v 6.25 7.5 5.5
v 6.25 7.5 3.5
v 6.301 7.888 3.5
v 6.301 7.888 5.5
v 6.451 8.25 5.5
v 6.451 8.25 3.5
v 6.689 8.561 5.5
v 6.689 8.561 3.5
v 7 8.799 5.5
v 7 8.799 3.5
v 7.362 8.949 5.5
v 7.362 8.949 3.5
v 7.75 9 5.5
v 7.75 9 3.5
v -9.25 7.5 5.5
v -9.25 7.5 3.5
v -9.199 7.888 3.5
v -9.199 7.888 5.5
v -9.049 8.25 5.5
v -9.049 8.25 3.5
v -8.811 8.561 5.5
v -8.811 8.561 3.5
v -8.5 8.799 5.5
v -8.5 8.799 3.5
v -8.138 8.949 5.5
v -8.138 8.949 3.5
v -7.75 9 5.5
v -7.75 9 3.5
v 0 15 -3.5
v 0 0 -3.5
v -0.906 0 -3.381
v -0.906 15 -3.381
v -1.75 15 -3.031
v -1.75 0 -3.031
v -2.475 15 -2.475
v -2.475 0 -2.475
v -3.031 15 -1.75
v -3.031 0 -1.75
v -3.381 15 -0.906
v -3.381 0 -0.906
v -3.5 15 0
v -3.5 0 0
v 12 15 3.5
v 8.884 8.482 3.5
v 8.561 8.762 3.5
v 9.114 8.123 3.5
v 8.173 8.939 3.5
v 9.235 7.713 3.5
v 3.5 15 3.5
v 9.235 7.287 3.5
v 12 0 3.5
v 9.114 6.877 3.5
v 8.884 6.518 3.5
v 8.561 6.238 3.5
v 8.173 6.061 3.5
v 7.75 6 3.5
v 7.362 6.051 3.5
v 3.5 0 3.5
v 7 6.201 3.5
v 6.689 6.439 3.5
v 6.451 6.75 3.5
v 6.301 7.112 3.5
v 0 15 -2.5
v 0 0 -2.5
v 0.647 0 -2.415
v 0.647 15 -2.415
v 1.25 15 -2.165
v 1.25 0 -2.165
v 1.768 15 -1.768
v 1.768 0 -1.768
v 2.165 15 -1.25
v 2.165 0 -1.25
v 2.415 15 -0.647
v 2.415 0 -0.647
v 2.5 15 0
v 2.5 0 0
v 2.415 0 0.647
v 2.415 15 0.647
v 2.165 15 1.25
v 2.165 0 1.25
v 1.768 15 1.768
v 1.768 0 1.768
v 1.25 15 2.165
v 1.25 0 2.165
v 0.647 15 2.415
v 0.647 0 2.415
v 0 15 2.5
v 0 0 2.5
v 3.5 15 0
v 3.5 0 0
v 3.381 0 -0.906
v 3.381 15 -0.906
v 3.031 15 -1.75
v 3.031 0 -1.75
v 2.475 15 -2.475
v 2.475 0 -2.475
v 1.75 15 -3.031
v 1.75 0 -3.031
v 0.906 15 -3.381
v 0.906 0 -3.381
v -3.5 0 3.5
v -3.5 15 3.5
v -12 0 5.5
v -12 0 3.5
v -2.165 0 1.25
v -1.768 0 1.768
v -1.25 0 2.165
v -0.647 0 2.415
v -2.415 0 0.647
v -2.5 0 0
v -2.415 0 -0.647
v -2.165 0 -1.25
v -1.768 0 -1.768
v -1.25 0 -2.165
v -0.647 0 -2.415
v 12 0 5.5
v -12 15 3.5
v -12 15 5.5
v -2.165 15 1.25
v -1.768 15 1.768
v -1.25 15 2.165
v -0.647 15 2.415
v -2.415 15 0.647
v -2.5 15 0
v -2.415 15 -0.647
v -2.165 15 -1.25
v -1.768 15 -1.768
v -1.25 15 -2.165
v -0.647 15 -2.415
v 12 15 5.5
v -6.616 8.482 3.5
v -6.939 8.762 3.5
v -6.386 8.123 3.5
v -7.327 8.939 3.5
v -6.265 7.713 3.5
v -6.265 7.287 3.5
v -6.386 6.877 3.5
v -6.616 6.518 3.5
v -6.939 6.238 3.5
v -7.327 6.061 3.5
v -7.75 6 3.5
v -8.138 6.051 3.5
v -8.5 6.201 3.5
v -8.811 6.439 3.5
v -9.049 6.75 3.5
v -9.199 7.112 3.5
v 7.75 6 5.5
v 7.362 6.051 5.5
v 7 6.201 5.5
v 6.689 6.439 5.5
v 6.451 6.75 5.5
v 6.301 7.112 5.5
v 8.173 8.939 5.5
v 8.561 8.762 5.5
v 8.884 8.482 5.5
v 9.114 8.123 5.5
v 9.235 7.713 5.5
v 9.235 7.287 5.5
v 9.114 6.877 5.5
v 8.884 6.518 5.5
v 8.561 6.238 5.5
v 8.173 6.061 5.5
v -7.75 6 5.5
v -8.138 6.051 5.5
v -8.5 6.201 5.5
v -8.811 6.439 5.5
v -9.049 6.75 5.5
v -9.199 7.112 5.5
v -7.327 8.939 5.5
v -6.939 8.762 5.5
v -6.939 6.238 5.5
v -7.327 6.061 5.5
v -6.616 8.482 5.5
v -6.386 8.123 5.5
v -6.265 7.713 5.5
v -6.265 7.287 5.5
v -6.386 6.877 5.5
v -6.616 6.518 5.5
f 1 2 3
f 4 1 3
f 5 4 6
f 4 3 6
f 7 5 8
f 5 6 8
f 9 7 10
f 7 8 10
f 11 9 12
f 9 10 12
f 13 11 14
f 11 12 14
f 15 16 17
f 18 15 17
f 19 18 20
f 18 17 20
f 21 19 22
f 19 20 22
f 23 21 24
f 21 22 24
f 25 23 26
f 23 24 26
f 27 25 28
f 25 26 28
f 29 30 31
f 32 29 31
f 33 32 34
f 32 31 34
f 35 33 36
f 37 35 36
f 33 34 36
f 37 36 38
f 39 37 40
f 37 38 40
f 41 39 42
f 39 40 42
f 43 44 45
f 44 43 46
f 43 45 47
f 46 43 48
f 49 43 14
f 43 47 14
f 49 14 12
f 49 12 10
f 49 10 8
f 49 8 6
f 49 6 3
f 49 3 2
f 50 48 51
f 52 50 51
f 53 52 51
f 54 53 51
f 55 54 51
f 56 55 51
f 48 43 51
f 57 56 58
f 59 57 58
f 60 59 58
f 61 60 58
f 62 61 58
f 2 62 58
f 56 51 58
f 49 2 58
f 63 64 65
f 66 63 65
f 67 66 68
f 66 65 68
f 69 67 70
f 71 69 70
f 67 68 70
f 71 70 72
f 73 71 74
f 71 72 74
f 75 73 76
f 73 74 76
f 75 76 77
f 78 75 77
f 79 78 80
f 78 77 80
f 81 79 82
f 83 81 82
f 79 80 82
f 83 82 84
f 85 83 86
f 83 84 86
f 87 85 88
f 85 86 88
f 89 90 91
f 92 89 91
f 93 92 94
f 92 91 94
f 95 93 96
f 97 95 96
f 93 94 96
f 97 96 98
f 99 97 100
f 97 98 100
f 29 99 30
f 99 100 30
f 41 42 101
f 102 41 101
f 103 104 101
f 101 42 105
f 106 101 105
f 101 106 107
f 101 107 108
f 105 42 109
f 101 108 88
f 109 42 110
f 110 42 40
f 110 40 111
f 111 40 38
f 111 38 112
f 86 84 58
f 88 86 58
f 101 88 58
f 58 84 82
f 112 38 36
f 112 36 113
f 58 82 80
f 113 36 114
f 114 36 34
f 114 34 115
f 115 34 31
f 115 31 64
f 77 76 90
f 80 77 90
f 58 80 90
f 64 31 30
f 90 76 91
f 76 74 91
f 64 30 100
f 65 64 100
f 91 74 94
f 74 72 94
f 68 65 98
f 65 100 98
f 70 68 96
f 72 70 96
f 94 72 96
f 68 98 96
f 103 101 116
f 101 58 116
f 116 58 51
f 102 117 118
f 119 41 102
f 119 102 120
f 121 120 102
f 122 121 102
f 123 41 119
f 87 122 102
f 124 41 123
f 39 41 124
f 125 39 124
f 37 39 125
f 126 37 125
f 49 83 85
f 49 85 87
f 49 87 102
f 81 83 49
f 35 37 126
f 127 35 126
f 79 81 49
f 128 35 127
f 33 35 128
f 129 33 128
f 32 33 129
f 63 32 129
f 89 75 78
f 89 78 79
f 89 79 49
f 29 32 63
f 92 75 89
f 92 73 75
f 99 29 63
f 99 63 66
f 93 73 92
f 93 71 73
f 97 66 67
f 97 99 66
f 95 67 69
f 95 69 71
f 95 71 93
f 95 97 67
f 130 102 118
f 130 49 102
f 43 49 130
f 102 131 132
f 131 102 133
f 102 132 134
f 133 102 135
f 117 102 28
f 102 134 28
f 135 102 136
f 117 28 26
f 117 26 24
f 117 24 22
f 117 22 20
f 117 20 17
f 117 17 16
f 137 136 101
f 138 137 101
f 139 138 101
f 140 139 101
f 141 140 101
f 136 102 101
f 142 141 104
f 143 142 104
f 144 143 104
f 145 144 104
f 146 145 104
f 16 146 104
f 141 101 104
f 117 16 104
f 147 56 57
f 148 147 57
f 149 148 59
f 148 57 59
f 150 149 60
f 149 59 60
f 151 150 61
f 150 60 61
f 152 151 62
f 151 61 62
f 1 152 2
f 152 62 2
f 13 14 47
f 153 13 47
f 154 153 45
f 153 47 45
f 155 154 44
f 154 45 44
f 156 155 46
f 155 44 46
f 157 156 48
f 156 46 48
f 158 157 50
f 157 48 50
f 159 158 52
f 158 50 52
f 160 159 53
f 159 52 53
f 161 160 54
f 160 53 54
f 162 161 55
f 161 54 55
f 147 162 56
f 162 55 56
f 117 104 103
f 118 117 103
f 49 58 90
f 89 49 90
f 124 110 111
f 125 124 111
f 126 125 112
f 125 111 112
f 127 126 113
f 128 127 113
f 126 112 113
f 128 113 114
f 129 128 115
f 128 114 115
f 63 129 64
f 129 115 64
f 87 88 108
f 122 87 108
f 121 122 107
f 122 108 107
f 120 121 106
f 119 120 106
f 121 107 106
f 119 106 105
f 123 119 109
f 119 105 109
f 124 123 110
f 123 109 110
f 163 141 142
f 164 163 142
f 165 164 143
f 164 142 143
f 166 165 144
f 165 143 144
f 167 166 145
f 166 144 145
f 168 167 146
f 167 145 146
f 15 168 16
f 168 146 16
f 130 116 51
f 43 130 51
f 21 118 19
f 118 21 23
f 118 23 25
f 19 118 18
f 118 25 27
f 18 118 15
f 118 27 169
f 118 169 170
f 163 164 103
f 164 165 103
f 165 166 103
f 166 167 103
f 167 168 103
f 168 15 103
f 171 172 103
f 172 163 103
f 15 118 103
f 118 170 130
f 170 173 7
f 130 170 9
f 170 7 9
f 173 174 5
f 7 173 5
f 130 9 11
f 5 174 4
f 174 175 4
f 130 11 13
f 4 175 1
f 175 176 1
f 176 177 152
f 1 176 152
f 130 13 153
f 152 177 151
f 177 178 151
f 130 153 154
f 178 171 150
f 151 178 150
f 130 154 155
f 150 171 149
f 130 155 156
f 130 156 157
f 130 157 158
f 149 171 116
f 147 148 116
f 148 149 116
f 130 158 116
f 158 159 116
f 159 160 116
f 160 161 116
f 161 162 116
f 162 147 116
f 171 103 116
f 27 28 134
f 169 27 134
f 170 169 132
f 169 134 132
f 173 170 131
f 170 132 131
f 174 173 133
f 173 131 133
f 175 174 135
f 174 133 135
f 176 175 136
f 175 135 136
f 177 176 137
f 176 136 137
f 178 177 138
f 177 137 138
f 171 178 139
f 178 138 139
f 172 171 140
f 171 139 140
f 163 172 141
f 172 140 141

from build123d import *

# Parameters (mm, degrees)
BOSS_EXTRUDE1_DEPTH = 15
CUT_EXTRUDE1_DEPTH  = 21.4450483


with BuildPart() as part:
    # Sketch1 → Boss-Extrude1 (new body)
    with BuildSketch(Plane(origin=(0, 0, 0), x_dir=(1, 0, 0), z_dir=(0, 1, 0))):
        with BuildLine():
            ThreePointArc((0, 2.5), (1.767766953, 1.767766953), (2.5, 0))
            Line((2.5, 0), (3.5, 0))
            ThreePointArc((3.5, 0), (2.474873734, 2.474873734), (0, 3.5))
            Line((0, 3.5), (0, 2.5))
        make_face()
        with BuildLine():
            Line((-3.5, 0), (-2.5, 0))
            ThreePointArc((-2.5, 0), (-1.767766953, 1.767766953), (0, 2.5))
            Line((0, 2.5), (0, 3.5))
            ThreePointArc((0, 3.5), (-2.474873734, 2.474873734), (-3.5, 0))
        make_face()
        with BuildLine():
            Line((0, -5.5), (0, -2.5))
            ThreePointArc((0, -2.5), (-1.767766953, -1.767766953), (-2.5, 0))
            Line((-2.5, 0), (-3.5, 0))
            Line((-3.5, 0), (-3.5, -3.5))
            Line((-3.5, -3.5), (-12, -3.5))
            Line((-12, -3.5), (-12, -5.5))
            Line((-12, -5.5), (0, -5.5))
        make_face()
        with BuildLine():
            ThreePointArc((2.5, 0), (1.767766953, -1.767766953), (0, -2.5))
            Line((0, -2.5), (0, -5.5))
            Line((0, -5.5), (12, -5.5))
            Line((12, -5.5), (12, -3.5))
            Line((12, -3.5), (3.5, -3.5))
            Line((3.5, -3.5), (3.5, 0))
            Line((3.5, 0), (2.5, 0))
        make_face()
    extrude(amount=BOSS_EXTRUDE1_DEPTH)

    # Sketch2 → Cut-Extrude1 (cut, through all)
    with BuildSketch(Plane(origin=(0, 0, 3.5), x_dir=(-1, 0, 0), z_dir=(0, 0, -1))):
        with BuildLine():
            ThreePointArc((-6.25, 7.5), (-6.689339828, 8.560660172), (-7.75, 9))
            Line((-7.75, 9), (-7.75, 6))
            ThreePointArc((-7.75, 6), (-6.689339828, 6.439339828), (-6.25, 7.5))
        make_face()
        with BuildLine():
            Line((-7.75, 6), (-7.75, 9))
            ThreePointArc((-7.75, 9), (-9.25, 7.5), (-7.75, 6))
        make_face()
        with BuildLine():
            ThreePointArc((9.25, 7.5), (8.810660172, 8.560660172), (7.75, 9))
            Line((7.75, 9), (7.75, 6))
            ThreePointArc((7.75, 6), (8.810660172, 6.439339828), (9.25, 7.5))
        make_face()
        with BuildLine():
            Line((7.75, 6), (7.75, 9))
            ThreePointArc((7.75, 9), (6.25, 7.5), (7.75, 6))
        make_face()
    extrude(amount=-CUT_EXTRUDE1_DEPTH, mode=Mode.SUBTRACT)


solid = part.part
